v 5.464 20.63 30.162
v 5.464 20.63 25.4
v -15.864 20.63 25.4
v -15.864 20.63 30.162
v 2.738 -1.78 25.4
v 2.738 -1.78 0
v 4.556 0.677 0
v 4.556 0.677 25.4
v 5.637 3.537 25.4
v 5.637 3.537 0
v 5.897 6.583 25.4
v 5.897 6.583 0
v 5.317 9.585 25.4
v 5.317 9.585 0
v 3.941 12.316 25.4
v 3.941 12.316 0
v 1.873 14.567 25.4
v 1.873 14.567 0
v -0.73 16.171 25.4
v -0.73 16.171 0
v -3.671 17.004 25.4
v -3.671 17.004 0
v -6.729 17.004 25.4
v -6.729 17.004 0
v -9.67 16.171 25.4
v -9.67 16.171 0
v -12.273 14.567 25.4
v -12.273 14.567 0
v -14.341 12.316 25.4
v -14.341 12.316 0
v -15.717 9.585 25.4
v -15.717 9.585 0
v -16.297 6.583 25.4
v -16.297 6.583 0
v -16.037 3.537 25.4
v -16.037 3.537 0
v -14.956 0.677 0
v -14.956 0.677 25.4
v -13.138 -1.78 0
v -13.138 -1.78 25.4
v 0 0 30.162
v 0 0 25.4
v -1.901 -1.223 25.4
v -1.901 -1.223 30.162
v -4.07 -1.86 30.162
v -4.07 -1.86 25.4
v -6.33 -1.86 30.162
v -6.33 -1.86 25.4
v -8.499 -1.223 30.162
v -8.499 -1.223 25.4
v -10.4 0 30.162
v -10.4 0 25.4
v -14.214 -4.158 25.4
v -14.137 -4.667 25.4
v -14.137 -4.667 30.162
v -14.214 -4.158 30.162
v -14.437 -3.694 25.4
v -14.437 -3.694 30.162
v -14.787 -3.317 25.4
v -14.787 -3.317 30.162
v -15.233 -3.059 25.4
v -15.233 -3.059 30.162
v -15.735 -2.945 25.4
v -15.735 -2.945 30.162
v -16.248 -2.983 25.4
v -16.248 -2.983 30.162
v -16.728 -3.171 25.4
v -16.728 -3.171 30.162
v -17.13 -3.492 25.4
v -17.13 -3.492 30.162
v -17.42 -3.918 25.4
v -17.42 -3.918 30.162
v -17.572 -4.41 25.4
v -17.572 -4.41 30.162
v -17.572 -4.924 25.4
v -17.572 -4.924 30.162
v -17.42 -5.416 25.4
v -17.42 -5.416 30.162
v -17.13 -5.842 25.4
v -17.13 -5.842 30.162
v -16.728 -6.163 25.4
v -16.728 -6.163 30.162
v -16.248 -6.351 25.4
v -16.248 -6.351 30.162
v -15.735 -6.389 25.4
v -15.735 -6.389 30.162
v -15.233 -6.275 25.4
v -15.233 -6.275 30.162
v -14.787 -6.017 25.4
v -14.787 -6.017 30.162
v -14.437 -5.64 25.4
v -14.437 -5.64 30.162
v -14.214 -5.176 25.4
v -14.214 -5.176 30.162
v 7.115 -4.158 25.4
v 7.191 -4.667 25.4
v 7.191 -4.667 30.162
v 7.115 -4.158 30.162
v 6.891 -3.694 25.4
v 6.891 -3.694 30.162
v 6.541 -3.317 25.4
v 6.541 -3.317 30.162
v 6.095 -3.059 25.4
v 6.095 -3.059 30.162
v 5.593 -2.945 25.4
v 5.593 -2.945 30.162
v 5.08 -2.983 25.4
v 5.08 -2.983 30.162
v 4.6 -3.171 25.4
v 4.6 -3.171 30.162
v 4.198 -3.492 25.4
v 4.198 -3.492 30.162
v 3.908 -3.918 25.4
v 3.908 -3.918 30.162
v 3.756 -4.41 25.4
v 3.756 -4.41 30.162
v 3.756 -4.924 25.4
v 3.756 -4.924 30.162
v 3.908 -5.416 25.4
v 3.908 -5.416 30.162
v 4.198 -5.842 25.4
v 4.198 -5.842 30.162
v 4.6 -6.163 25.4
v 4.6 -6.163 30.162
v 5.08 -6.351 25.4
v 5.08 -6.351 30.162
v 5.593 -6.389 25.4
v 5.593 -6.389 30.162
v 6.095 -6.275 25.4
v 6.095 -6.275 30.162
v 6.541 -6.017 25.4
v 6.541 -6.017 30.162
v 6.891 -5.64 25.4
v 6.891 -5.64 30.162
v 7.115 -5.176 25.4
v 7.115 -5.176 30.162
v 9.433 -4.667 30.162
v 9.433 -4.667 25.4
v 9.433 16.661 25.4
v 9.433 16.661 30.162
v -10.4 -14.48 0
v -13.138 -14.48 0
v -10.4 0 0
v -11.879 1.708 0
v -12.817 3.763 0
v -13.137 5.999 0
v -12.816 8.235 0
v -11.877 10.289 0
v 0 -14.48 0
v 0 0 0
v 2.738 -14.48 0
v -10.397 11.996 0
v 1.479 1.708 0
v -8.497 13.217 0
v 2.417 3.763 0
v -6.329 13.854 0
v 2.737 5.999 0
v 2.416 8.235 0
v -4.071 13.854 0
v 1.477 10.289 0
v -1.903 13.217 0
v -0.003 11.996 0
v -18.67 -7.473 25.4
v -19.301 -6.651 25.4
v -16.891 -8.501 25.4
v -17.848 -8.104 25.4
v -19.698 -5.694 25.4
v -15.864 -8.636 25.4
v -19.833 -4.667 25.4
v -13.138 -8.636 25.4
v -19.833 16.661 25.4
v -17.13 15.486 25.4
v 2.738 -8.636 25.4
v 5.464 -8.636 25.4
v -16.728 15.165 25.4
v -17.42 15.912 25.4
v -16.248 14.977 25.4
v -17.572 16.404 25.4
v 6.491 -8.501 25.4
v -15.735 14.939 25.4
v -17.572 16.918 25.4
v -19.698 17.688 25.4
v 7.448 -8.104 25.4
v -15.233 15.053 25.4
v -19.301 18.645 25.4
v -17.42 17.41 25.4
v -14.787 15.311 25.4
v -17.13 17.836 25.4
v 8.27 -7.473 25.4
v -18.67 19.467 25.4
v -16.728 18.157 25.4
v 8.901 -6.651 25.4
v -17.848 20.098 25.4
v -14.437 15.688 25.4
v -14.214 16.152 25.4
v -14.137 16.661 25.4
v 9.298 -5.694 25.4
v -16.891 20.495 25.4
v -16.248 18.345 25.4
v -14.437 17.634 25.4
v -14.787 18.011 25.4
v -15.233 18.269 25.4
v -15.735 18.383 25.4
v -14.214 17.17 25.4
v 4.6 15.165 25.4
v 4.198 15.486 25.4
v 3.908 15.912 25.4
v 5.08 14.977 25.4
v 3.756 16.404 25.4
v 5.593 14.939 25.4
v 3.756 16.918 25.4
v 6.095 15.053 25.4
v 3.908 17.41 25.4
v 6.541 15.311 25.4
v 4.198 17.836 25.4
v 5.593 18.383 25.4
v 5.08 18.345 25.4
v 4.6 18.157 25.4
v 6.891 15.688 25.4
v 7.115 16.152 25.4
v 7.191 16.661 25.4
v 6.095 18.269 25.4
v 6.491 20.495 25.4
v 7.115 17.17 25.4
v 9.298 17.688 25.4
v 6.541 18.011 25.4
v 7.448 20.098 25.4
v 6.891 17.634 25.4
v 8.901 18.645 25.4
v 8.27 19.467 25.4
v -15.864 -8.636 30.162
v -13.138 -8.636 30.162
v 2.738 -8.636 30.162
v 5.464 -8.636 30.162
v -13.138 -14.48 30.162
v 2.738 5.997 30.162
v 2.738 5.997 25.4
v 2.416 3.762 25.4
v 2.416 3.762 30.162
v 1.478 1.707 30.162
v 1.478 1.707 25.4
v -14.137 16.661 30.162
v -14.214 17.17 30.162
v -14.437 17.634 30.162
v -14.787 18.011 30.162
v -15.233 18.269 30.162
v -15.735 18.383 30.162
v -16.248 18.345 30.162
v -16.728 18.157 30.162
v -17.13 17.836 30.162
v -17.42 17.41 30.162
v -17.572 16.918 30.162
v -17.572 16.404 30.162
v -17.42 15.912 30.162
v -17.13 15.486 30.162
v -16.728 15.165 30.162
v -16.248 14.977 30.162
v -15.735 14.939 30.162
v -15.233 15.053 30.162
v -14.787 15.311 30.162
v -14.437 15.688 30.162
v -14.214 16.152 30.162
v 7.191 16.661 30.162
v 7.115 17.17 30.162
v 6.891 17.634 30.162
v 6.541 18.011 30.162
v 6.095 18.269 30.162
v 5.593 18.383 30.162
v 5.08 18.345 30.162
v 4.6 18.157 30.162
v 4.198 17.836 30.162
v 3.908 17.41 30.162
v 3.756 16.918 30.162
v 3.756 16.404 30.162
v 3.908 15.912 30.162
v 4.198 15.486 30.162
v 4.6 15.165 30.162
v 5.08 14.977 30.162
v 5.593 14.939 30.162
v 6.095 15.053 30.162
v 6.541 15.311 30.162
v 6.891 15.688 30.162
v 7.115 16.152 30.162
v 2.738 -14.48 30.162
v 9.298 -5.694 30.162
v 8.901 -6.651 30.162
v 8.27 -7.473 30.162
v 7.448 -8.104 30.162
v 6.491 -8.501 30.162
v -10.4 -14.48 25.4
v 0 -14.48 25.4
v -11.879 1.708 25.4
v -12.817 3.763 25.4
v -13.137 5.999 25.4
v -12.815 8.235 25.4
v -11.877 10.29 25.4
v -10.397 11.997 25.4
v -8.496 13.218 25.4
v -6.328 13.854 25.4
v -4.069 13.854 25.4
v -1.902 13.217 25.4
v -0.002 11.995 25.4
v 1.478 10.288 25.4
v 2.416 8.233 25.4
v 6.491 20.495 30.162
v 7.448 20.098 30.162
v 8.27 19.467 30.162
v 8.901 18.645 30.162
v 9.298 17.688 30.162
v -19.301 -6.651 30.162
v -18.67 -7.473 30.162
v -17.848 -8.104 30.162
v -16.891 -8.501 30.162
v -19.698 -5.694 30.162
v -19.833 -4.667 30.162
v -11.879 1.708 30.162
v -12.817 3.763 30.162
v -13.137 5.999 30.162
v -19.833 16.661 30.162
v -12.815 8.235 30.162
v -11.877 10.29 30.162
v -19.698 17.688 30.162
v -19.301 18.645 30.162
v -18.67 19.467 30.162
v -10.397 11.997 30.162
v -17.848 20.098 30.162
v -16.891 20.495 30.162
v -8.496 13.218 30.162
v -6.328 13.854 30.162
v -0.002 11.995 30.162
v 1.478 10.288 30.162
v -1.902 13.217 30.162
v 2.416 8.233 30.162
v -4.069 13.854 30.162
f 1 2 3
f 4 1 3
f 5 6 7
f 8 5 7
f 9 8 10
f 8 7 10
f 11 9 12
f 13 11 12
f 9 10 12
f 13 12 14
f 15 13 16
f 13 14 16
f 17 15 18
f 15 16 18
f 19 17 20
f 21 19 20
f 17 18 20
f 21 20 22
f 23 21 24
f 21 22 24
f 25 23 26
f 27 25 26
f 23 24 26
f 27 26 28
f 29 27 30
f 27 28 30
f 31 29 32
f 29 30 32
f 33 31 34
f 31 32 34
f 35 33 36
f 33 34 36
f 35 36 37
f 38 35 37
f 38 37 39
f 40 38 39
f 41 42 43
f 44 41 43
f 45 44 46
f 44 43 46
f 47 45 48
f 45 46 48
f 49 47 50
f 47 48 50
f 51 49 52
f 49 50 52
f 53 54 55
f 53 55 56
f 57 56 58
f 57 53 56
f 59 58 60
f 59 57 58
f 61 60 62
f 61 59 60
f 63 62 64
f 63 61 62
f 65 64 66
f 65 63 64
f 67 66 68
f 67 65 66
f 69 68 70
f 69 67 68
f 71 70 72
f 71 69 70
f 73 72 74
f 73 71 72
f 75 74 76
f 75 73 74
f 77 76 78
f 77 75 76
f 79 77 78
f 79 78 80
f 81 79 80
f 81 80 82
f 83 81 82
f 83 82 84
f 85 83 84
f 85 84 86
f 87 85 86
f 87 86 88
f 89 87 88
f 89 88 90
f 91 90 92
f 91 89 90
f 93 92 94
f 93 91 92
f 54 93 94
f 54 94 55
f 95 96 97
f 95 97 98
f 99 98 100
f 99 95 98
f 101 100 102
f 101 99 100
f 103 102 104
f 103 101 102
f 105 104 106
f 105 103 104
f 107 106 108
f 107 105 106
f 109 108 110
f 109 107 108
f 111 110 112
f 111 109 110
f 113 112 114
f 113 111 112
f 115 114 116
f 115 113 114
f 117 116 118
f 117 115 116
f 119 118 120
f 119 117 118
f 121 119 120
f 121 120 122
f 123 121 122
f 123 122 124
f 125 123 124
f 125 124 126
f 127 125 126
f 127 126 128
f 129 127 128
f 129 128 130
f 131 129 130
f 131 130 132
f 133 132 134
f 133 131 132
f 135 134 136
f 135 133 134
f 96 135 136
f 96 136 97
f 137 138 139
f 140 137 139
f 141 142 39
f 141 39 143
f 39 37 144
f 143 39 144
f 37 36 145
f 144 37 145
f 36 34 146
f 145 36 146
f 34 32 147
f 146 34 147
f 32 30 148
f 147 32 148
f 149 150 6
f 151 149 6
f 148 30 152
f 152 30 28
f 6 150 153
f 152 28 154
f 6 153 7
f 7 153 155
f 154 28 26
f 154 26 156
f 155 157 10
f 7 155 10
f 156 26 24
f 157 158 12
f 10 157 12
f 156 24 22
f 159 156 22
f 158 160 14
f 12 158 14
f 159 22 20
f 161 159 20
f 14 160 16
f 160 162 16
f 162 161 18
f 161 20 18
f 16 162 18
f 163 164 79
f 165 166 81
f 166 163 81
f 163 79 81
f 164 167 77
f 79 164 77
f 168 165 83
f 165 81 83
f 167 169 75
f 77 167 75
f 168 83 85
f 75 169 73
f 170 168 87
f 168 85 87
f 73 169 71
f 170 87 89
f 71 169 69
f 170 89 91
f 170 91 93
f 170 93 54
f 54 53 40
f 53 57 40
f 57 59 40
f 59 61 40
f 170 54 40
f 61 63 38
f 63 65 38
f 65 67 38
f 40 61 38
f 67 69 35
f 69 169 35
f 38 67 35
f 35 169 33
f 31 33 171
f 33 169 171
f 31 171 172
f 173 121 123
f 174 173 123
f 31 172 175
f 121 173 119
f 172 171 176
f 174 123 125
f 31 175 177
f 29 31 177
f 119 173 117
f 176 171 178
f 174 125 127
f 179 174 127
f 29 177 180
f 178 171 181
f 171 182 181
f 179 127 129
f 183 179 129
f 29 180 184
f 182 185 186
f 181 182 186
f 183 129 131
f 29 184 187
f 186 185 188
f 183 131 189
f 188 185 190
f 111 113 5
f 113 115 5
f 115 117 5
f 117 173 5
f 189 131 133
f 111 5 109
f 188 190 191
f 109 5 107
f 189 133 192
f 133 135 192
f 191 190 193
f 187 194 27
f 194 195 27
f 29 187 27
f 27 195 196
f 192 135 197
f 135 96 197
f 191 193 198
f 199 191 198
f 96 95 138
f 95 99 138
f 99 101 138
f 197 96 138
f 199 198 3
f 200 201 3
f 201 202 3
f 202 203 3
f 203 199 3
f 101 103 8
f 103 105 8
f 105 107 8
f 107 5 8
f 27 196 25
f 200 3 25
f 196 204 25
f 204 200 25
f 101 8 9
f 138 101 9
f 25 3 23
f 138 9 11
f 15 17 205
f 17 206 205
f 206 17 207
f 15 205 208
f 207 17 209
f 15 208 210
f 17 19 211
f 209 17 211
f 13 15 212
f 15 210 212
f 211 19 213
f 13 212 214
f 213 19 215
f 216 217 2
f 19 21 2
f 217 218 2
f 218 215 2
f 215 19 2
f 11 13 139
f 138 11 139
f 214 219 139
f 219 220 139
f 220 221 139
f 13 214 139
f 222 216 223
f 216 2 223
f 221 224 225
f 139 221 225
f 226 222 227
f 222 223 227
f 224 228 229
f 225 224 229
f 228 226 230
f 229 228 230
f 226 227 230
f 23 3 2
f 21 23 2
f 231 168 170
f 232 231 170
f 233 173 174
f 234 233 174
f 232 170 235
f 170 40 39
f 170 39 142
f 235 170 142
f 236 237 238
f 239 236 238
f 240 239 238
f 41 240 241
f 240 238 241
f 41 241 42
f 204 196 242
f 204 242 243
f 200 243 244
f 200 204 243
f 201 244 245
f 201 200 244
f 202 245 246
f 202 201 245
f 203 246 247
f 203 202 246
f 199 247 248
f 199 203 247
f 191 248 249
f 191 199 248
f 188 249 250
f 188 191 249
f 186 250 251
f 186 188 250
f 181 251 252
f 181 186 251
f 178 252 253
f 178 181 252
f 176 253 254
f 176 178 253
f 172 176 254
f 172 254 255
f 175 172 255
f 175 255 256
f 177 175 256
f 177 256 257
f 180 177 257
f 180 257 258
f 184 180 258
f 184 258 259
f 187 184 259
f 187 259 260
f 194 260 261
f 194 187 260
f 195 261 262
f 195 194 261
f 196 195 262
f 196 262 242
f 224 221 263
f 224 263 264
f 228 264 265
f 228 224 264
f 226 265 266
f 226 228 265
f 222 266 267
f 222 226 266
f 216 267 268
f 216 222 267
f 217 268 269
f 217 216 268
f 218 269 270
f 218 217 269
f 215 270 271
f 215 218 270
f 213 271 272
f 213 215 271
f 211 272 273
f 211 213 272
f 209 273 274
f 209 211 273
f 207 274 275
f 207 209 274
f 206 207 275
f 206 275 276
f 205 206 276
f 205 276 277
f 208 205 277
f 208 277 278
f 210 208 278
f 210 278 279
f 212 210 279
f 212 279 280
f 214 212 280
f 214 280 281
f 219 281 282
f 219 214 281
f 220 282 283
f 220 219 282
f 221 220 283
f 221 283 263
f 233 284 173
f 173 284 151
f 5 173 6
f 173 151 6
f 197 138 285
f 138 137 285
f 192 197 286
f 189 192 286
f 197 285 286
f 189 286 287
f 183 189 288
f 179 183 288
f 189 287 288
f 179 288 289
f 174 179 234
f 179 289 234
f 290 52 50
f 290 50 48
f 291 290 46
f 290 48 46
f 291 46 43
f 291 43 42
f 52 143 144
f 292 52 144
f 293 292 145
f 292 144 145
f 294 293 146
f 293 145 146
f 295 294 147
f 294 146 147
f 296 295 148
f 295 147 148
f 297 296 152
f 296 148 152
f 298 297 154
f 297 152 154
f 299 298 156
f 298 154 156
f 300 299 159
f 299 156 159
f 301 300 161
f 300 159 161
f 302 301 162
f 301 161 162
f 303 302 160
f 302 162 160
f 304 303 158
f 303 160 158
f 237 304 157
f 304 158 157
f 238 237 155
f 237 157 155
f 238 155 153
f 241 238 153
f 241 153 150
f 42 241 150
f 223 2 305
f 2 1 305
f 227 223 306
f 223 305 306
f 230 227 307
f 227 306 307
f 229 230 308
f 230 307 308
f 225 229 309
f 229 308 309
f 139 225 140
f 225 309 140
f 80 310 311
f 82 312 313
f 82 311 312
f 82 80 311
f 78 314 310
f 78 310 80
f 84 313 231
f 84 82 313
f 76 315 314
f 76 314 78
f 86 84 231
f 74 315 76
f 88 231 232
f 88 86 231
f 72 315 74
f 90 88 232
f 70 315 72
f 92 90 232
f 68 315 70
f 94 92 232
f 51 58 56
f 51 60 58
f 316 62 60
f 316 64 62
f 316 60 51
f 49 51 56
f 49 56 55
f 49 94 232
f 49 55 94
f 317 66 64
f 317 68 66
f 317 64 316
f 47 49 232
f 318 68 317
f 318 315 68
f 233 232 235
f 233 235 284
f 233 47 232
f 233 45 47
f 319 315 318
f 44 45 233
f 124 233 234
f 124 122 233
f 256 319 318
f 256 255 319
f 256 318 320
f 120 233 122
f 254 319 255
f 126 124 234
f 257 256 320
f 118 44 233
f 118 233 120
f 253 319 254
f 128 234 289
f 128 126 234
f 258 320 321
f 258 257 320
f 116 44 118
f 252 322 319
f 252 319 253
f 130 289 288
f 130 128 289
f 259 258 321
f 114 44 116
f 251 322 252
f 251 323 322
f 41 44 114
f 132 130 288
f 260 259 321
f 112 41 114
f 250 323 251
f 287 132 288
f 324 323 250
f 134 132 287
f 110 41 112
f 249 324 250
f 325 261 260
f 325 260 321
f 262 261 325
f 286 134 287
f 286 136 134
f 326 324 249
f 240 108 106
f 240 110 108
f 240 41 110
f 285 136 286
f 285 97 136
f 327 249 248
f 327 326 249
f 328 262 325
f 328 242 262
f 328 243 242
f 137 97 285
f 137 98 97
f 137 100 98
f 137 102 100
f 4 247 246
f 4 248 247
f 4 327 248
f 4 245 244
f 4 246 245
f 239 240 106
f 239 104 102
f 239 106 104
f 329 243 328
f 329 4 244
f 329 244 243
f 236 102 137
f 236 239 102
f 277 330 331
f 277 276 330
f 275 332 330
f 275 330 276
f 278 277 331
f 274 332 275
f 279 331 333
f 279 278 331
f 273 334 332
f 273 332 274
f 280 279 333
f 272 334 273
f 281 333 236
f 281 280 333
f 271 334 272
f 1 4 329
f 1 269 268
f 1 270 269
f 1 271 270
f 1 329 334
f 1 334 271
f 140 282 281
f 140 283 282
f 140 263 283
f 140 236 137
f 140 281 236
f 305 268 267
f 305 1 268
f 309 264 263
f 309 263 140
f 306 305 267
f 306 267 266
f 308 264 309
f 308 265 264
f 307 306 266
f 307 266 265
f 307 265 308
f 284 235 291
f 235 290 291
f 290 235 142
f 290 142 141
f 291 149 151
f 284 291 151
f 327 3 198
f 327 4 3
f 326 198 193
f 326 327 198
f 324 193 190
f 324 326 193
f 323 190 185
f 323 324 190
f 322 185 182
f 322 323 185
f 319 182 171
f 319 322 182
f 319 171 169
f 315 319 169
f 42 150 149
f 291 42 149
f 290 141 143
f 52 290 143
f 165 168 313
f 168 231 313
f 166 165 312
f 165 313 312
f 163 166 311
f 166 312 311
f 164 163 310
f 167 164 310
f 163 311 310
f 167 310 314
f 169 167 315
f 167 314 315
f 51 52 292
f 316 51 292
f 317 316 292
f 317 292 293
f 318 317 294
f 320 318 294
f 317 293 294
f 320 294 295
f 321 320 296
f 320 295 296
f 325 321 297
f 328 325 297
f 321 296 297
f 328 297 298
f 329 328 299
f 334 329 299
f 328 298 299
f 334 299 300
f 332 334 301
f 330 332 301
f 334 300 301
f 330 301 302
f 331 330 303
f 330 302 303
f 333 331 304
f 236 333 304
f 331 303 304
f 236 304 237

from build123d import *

# Parameters (mm, degrees)
F1_DEPTH = 25.4
F2_R     = 1.7272
F3_DEPTH = 4.7625
F4_R     = 3.96875


with BuildPart() as f1:
    # F0 (on Top) → F1 (new body)
    with BuildSketch(Plane.XY):
        with BuildLine():
            ThreePointArc((-10.4, 0), (-5.2, 13.934491), (0, 0))
            Line((0, 0), (0, -14.480139))
            Line((0, -14.480139), (2.7375, -14.480139))
            Line((2.7375, -14.480139), (2.7375, -1.780139))
            ThreePointArc((2.7375, -1.780139), (-5.2, 17.109491), (-13.1375, -1.780139))
            Line((-13.1375, -1.780139), (-13.1375, -14.480139))
            Line((-13.1375, -14.480139), (-10.4, -14.480139))
            Line((-10.4, -14.480139), (-10.4, 0))
        make_face()
    extrude(amount=F1_DEPTH)

    # F2 (on face) → F3 (join)
    with BuildSketch(Plane.XY.offset(25.4)):
        with BuildLine():
            Line((-19.832804, -8.635813), (-13.1375, -8.635813))
            Line((-13.1375, -8.635813), (-13.1375, -1.780139))
            ThreePointArc((-13.1375, -1.780139), (-5.2, 17.109491), (2.7375, -1.780139))
            Line((2.7375, -1.780139), (2.7375, -8.635813))
            Line((2.7375, -8.635813), (9.432804, -8.635813))
            Line((9.432804, -8.635813), (9.432804, 20.629796))
            Line((9.432804, 20.629796), (-19.832804, 20.629796))
            Line((-19.832804, 20.629796), (-19.832804, -8.635813))
        make_face()
        with Locations((-15.864054, -4.667063)):
            Circle(F2_R, mode=Mode.SUBTRACT)
        with Locations((5.464054, -4.667063)):
            Circle(F2_R, mode=Mode.SUBTRACT)
        with Locations((-15.864054, 16.661046)):
            Circle(F2_R, mode=Mode.SUBTRACT)
        with Locations((5.464054, 16.661046)):
            Circle(F2_R, mode=Mode.SUBTRACT)
        with BuildLine():
            Line((-13.1375, -8.635813), (-13.1375, -14.480139))
            Line((-13.1375, -14.480139), (-10.4, -14.480139))
            Line((-10.4, -14.480139), (-10.4, 0))
            ThreePointArc((-10.4, 0), (-8.496127, 13.217757), (2.7375, 5.996991))
            ThreePointArc((2.7375, 5.996991), (2.020765, 2.700864), (0, 0))
            Line((0, 0), (0, -14.480139))
            Line((0, -14.480139), (2.7375, -14.480139))
            Line((2.7375, -14.480139), (2.7375, -8.635813))
            Line((2.7375, -8.635813), (2.7375, -1.780139))
            ThreePointArc((2.7375, -1.780139), (-5.2, 17.109491), (-13.1375, -1.780139))
            Line((-13.1375, -1.780139), (-13.1375, -8.635813))
        make_face()
        with BuildLine():
            Line((-10.4, 0), (-10.4, -14.480139))
            Line((-10.4, -14.480139), (0, -14.480139))
            Line((0, -14.480139), (0, 0))
            ThreePointArc((0, 0), (-5.2, -1.940509), (-10.4, 0))
        make_face()
    extrude(amount=F3_DEPTH)

    # F4
    f4_edges = [f1.edges().sort_by_distance(p)[0] for p in [
        (-19.832804, -8.635813, 27.78125),
        (9.432804, -8.635813, 27.78125),
        (9.432804, 20.629796, 27.78125),
        (-19.832804, 20.629796, 27.78125),
    ]]
    fillet(f4_edges, radius=F4_R)


solid = f1.part
